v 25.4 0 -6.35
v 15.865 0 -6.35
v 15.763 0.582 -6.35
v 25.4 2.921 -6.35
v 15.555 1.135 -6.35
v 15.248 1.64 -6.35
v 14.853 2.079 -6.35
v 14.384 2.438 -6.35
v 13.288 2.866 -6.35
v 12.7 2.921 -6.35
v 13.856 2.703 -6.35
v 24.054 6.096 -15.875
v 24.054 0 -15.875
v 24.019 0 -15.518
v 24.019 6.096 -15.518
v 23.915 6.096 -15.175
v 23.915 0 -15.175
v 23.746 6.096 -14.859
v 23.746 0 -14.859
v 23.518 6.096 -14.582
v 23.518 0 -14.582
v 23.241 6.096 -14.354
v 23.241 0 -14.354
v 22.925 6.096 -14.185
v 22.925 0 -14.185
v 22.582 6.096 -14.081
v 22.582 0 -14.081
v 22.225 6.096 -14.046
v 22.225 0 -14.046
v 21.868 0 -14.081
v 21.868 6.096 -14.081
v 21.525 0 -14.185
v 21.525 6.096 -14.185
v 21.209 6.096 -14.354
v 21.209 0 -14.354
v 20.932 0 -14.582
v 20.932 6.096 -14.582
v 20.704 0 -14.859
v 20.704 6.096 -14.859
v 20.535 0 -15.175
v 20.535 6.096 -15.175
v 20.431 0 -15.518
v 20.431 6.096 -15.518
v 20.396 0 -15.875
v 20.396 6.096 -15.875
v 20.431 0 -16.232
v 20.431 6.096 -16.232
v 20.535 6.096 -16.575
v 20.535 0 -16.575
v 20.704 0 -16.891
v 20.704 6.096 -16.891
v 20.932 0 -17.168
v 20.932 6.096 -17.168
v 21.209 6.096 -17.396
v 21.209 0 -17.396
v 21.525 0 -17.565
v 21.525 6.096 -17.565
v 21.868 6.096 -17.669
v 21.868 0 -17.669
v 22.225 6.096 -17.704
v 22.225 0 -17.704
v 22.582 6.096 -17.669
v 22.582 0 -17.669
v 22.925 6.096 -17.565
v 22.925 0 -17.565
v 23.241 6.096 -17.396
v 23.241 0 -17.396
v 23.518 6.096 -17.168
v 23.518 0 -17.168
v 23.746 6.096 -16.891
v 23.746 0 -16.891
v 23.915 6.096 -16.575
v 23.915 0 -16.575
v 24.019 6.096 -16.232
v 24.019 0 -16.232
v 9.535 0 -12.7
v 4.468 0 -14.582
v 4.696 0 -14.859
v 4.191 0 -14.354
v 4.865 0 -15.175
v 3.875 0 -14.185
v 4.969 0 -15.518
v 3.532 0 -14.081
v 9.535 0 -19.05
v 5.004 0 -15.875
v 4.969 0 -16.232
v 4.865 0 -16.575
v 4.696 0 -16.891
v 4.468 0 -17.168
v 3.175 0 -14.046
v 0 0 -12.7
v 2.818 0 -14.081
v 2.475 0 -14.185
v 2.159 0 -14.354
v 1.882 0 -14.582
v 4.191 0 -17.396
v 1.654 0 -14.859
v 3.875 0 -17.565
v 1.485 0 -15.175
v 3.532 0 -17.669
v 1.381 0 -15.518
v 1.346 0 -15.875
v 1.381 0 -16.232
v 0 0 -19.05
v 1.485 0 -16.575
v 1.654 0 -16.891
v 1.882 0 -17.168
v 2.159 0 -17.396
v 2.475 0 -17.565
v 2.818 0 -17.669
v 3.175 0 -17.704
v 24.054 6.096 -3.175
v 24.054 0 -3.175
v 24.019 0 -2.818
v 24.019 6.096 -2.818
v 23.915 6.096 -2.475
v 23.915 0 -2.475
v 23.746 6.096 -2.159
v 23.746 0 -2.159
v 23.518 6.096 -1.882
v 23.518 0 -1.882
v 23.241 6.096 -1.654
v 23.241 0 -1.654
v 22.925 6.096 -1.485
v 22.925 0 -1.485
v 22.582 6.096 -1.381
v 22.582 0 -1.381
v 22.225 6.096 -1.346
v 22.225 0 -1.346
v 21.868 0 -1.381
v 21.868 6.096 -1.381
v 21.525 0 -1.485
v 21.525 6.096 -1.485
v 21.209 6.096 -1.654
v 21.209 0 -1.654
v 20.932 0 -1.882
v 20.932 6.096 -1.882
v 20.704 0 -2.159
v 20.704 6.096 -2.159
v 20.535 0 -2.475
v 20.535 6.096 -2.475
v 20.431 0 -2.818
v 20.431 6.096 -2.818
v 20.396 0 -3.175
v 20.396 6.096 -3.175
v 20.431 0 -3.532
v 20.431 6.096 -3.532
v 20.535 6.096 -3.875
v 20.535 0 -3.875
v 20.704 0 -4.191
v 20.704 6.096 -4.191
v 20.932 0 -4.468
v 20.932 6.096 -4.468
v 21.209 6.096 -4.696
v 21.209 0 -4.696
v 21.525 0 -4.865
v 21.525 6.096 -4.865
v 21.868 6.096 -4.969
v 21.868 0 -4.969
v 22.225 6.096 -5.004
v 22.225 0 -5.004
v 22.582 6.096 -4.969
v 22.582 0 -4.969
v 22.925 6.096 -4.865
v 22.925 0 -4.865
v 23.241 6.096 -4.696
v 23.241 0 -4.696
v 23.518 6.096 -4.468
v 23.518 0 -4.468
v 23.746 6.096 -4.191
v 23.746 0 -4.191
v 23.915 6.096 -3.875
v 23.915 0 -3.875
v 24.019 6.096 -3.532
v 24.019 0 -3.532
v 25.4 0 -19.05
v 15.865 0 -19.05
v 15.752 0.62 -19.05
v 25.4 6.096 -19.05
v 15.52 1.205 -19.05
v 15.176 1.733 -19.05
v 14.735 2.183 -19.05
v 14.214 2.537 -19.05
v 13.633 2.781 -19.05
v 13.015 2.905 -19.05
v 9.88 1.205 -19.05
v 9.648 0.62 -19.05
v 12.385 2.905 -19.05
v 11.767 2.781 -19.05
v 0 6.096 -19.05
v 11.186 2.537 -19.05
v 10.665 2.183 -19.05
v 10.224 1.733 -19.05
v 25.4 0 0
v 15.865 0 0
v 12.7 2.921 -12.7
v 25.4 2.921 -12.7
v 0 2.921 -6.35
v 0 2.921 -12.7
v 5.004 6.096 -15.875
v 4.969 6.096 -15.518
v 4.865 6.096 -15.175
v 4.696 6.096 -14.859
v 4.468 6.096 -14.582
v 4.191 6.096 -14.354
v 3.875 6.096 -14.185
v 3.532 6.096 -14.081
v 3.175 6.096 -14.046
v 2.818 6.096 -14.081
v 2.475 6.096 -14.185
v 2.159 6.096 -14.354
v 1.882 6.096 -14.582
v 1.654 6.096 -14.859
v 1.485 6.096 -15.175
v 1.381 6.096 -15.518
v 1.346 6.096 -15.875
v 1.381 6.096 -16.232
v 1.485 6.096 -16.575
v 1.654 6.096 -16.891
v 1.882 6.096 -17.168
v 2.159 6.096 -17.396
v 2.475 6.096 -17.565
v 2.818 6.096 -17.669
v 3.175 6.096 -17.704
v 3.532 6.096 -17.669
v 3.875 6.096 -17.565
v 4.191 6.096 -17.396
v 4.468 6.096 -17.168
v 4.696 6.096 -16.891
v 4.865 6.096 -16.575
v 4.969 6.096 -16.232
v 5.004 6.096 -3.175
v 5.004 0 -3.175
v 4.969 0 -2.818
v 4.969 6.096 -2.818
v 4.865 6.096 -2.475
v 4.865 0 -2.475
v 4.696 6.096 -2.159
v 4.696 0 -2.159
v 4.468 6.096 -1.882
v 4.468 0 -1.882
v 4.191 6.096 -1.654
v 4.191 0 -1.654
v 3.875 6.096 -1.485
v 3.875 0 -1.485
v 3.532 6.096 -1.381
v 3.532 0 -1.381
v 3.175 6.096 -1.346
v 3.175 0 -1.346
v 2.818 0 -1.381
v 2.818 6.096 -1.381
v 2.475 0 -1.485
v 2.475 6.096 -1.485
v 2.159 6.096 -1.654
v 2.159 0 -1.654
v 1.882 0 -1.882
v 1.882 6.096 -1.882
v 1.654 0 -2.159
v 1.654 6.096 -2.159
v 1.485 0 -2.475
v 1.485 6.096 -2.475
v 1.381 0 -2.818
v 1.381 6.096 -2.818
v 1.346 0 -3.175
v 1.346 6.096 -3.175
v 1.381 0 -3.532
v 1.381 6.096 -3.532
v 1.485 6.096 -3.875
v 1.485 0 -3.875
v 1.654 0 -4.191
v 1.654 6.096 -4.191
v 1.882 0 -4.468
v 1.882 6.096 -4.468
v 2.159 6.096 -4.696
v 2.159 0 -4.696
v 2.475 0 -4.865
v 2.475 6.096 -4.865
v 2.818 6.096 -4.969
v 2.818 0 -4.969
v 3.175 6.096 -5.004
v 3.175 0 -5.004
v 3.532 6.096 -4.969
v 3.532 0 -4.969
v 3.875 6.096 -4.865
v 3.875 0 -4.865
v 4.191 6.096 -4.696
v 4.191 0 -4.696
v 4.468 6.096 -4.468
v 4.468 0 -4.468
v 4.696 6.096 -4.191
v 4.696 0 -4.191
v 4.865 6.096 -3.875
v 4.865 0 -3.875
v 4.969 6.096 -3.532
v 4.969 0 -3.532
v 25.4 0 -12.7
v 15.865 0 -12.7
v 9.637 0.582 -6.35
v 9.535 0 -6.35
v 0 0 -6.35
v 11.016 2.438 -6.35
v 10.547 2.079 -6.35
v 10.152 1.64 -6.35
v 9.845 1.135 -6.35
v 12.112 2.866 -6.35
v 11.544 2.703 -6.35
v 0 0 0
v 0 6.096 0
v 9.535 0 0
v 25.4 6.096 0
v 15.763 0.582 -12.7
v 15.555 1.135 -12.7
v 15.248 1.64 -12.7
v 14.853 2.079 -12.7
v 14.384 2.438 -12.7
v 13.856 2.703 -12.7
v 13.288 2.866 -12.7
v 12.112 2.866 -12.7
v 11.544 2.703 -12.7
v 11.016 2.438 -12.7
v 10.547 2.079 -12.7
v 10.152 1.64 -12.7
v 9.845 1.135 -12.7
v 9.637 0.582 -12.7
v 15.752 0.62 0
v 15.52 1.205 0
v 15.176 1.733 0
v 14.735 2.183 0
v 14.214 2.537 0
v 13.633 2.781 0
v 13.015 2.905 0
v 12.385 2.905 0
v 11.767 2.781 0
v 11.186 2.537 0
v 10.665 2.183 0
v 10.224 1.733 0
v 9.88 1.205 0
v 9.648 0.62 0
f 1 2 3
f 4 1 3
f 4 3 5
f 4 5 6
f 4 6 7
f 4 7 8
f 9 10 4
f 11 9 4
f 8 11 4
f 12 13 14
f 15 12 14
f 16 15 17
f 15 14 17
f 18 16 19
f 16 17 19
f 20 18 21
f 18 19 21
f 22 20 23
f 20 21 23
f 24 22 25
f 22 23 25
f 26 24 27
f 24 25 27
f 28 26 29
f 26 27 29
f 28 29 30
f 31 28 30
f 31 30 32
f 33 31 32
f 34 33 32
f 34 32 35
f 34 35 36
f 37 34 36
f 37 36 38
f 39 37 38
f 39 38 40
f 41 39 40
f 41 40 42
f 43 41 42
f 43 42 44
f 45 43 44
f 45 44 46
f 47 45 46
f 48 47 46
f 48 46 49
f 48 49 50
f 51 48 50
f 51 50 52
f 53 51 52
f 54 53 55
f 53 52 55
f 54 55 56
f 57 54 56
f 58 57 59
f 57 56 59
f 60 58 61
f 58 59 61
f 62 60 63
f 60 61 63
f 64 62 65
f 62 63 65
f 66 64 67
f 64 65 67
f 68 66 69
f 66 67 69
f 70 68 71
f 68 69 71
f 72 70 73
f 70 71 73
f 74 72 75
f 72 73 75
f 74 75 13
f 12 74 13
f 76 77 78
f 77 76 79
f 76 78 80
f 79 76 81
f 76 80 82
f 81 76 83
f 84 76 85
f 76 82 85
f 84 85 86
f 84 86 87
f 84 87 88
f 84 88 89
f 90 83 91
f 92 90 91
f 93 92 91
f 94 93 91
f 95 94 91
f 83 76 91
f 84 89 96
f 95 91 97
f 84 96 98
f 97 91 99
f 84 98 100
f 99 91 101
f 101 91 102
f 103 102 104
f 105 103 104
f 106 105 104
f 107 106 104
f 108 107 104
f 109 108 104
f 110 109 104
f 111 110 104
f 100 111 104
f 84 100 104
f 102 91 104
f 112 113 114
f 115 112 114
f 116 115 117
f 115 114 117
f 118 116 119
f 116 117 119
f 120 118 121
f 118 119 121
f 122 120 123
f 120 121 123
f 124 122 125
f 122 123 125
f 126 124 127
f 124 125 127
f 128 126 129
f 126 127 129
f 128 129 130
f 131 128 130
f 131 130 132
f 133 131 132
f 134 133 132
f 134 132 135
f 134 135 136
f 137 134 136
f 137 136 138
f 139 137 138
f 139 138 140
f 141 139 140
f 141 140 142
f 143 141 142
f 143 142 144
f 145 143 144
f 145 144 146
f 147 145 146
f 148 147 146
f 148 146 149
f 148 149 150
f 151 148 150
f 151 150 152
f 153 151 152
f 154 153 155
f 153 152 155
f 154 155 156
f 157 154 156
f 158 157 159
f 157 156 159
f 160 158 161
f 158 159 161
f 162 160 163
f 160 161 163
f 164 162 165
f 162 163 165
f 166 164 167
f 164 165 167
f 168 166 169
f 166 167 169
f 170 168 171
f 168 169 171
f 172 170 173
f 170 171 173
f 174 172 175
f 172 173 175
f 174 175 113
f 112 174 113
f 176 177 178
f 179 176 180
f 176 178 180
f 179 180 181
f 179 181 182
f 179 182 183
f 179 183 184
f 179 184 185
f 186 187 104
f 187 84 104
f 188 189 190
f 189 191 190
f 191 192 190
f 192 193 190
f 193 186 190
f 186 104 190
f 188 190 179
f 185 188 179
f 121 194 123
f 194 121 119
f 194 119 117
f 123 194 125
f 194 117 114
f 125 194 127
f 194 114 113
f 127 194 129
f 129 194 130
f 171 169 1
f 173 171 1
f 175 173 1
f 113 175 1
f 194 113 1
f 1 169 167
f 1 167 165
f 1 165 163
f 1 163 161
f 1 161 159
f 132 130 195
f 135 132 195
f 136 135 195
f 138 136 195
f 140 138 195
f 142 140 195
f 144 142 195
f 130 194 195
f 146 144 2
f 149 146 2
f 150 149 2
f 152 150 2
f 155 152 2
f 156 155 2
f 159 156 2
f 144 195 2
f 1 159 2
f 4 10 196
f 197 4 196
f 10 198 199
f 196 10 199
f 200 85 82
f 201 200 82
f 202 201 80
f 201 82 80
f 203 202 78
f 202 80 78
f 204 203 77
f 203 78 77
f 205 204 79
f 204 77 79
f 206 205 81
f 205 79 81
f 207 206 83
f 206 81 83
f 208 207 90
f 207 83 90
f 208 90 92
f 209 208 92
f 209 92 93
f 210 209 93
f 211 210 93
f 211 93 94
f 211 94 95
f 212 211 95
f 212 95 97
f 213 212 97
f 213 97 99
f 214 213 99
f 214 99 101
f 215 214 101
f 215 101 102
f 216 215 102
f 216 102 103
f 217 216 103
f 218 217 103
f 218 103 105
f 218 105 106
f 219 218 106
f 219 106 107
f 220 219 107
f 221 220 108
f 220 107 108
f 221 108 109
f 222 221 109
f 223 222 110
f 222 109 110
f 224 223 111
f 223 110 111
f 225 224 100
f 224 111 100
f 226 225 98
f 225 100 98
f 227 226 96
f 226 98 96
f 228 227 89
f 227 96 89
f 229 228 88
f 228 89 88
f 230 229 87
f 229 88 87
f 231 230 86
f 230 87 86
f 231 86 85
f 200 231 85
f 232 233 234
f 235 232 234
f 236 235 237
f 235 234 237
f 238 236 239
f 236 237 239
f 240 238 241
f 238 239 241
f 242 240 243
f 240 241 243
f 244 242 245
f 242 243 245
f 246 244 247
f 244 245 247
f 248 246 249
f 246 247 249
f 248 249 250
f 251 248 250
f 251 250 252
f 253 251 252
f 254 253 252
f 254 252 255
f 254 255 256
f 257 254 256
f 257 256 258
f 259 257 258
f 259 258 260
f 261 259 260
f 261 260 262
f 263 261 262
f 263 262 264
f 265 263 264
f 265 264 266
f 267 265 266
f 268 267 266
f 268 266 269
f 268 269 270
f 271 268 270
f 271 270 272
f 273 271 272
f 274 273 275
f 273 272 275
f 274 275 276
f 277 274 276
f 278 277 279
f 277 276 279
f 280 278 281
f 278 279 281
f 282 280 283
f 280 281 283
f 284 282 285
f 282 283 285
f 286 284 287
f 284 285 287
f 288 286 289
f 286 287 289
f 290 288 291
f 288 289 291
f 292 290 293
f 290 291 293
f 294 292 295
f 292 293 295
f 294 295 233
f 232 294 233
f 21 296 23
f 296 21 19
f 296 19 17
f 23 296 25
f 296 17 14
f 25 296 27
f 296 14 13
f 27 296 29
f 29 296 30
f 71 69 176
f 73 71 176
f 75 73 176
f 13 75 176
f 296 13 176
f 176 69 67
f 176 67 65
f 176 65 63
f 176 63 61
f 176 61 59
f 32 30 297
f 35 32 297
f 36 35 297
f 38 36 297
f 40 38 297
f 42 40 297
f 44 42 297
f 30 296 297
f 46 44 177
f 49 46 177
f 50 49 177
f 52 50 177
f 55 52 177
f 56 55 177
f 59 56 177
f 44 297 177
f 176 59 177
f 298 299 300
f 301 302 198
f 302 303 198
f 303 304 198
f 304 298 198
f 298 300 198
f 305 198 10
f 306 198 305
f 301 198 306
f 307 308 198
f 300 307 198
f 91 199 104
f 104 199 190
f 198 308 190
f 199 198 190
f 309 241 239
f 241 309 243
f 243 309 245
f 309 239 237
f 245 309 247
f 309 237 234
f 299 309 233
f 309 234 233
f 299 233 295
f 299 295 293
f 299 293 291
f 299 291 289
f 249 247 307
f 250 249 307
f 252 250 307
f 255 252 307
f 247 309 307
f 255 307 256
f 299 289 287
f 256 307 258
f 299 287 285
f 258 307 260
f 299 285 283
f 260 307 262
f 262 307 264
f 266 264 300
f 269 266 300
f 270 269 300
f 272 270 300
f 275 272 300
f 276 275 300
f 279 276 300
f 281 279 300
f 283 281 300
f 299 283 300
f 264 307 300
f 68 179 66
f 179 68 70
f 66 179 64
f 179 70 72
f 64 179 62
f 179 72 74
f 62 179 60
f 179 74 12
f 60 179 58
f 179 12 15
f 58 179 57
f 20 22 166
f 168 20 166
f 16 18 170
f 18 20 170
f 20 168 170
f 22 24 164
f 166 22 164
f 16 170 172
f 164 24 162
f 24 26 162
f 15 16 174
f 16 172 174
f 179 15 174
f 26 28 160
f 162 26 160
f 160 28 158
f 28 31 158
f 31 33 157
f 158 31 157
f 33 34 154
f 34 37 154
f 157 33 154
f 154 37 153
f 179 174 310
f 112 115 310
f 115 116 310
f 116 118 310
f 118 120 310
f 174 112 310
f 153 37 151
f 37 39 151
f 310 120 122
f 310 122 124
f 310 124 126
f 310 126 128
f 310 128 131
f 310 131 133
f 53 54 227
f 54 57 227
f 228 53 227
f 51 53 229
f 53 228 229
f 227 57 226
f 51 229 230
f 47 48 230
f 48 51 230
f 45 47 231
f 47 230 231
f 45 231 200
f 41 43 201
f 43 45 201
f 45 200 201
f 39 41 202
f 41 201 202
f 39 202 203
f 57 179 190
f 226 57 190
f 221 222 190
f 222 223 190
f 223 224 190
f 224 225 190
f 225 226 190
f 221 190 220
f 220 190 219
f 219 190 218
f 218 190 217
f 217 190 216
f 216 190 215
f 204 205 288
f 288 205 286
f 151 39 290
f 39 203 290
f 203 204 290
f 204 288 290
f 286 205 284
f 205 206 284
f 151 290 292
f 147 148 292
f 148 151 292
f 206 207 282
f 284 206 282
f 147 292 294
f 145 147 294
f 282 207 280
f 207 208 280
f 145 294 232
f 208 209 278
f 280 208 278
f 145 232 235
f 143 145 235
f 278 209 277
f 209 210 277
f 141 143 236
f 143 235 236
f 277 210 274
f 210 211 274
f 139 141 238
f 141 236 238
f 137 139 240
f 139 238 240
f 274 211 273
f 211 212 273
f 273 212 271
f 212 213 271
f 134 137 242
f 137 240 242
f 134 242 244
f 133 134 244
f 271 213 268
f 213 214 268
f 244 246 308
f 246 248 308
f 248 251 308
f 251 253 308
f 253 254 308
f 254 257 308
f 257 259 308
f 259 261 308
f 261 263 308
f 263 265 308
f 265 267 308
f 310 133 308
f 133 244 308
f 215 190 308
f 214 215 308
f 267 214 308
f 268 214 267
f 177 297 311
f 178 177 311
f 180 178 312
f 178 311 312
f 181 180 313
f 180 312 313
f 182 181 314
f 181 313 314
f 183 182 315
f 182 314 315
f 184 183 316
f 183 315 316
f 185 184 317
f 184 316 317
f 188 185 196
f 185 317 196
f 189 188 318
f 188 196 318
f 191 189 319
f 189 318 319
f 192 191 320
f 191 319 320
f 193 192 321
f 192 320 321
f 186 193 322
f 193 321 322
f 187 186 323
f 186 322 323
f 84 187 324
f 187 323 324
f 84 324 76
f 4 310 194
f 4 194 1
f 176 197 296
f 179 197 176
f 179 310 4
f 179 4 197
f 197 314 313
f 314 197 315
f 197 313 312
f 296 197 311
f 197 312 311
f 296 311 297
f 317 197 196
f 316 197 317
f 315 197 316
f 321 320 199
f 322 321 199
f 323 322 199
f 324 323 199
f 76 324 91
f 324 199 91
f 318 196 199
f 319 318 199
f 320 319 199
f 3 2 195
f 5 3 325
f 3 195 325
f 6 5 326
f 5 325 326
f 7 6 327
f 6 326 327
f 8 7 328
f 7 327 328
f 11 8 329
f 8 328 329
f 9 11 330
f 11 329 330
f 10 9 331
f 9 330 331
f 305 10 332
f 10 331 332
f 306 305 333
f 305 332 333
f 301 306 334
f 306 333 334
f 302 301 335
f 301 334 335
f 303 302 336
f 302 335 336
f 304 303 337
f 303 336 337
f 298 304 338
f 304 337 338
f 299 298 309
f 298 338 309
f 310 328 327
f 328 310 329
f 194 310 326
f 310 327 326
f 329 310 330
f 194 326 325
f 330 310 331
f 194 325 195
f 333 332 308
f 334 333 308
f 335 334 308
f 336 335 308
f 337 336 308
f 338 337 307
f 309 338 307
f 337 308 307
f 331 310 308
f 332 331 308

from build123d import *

# Parameters (mm, degrees)
BOSS_EXTRUDE1_DEPTH = 25.4
SKETCH2_R           = 3.175
CUT_EXTRUDE2_DEPTH  = 20.05
SKETCH4_R           = 1.8288
CUT_EXTRUDE3_DEPTH  = 7.096


with BuildPart() as part:
    # Sketch1 → Boss-Extrude1 (new body)
    with BuildSketch(Plane(origin=(0, 0, 0), x_dir=(0, 0, -1), z_dir=(1, 0, 0))):
        Polygon((0, 6.096), (0, 0), (6.35, 0), (6.35, 2.921), (12.7, 2.921), (12.7, 0), (19.05, 0), (19.05, 6.096), align=None)
    extrude(amount=BOSS_EXTRUDE1_DEPTH)

    # Sketch2 → Cut-Extrude2 (cut, through all)
    with BuildSketch(Plane.XY):
        with Locations((12.7, -0.254)):
            Circle(SKETCH2_R)
    extrude(amount=-CUT_EXTRUDE2_DEPTH, mode=Mode.SUBTRACT)

    # Sketch4 → Cut-Extrude3 (cut, through all)
    with BuildSketch(Plane.XZ):
        with Locations((3.175, -3.175)):
            Circle(SKETCH4_R)
        with Locations((3.175, -15.875)):
            Circle(SKETCH4_R)
        with Locations((22.225, -3.175)):
            Circle(SKETCH4_R)
        with Locations((22.225, -15.875)):
            Circle(SKETCH4_R)
    extrude(amount=-CUT_EXTRUDE3_DEPTH, mode=Mode.SUBTRACT)


solid = part.part
